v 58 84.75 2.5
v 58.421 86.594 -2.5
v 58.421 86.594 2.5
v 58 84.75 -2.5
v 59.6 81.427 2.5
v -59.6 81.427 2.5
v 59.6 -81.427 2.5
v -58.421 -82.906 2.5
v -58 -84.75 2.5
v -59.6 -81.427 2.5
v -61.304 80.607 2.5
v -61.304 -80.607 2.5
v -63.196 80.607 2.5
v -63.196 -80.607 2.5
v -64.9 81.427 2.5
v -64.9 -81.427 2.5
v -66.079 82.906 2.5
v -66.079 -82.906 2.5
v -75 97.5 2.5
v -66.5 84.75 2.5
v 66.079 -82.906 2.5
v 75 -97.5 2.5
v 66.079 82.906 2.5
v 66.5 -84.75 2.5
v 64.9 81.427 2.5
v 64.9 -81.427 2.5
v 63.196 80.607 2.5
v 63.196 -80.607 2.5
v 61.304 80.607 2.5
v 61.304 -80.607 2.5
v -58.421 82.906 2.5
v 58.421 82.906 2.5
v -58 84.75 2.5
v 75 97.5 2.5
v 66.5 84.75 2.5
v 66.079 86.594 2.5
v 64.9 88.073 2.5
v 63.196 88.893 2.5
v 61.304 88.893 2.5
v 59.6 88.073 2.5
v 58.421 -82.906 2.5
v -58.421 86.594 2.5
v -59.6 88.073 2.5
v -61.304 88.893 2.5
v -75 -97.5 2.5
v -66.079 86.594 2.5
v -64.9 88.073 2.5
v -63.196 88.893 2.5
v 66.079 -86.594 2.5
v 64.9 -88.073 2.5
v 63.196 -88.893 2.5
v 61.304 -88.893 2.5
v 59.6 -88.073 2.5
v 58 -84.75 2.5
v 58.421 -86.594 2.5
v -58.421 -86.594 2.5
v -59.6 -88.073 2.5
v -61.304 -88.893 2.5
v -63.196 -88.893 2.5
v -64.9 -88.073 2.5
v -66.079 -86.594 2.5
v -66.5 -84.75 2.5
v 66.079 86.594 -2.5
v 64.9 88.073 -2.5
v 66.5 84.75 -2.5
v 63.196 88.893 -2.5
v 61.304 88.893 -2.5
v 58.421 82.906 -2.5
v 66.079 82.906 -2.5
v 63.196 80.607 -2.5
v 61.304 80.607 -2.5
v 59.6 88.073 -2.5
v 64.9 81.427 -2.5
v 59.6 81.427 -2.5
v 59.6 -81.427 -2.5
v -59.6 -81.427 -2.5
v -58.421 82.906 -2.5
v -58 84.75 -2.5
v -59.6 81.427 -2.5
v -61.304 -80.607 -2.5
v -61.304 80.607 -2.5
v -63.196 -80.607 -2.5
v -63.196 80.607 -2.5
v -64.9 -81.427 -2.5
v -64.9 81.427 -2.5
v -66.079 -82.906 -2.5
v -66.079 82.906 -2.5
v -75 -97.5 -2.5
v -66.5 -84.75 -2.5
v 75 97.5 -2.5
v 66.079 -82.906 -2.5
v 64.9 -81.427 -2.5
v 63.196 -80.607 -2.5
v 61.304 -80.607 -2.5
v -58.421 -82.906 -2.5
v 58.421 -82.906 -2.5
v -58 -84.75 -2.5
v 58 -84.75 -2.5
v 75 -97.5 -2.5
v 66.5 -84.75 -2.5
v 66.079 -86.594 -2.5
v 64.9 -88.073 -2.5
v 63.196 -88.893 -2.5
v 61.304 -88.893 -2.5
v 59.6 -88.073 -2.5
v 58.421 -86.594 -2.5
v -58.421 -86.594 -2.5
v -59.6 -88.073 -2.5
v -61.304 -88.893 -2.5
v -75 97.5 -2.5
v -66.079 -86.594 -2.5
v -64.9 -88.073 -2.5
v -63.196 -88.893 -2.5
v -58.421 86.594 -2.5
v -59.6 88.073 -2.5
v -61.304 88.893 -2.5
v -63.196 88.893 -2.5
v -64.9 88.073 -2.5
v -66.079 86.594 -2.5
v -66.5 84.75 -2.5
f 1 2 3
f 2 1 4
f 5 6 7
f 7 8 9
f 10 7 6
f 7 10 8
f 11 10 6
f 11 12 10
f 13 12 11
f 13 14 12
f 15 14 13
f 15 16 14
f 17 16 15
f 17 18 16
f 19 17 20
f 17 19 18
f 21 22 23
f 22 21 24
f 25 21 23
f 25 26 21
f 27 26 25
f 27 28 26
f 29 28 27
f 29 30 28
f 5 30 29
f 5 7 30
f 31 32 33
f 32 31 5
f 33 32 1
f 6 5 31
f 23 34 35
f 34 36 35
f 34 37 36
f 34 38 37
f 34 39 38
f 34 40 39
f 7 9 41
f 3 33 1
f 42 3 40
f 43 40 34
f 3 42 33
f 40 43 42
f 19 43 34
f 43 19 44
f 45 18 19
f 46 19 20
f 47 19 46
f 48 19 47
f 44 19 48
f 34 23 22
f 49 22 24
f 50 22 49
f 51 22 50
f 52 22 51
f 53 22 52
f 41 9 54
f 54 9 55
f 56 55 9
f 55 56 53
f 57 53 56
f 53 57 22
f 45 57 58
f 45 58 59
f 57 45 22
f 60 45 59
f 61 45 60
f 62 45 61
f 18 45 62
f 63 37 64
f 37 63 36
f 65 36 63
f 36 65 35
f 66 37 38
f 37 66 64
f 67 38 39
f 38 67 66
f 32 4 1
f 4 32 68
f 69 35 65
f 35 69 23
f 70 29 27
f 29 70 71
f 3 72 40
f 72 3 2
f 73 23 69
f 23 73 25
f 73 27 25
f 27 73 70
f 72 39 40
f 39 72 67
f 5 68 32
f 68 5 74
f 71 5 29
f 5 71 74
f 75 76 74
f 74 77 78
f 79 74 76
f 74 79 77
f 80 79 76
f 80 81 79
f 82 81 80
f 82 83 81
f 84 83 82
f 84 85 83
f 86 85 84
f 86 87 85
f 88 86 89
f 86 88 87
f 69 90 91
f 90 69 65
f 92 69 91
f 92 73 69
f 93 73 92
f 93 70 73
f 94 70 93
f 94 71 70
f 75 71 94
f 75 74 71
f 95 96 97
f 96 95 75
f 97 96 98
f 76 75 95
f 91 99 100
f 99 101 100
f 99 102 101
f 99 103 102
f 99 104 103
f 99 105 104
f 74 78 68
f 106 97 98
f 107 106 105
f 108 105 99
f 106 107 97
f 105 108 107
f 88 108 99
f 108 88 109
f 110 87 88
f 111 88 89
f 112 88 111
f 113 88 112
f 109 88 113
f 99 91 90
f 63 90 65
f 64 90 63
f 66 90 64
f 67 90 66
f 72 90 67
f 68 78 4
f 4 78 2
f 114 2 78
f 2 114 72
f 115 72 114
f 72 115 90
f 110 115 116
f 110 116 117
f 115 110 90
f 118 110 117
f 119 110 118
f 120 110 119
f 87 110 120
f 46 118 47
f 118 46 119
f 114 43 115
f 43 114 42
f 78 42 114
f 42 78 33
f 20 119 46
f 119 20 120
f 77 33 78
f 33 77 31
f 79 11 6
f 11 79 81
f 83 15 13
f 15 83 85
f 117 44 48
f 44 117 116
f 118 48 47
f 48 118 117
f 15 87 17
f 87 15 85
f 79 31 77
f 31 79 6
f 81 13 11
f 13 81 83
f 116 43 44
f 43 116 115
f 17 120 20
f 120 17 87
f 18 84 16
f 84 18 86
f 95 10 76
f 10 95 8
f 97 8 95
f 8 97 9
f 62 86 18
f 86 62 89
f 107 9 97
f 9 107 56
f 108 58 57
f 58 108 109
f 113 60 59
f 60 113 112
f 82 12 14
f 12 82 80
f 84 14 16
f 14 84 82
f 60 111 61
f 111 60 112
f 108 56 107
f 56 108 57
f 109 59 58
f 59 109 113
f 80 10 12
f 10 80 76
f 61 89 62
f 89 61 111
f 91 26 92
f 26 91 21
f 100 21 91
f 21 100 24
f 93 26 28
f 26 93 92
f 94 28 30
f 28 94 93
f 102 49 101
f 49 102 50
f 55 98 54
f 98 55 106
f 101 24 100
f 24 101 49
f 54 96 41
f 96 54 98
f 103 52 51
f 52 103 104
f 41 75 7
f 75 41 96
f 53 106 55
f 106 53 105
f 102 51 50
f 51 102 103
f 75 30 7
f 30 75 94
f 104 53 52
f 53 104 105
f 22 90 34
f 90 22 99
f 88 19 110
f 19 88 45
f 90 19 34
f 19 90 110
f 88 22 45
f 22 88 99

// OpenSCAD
// Generated by SolidPython 1.1.3 on 2023-12-07 16:50:21


difference() {
	cube(center = true, size = [150, 195.0000000000, 5]);
	union() {
		translate(v = [62.2500000000, 84.7500000000]) {
			cylinder(center = true, h = 5, r = 4.2500000000);
		}
		translate(v = [-62.2500000000, 84.7500000000]) {
			cylinder(center = true, h = 5, r = 4.2500000000);
		}
		translate(v = [-62.2500000000, -84.7500000000]) {
			cylinder(center = true, h = 5, r = 4.2500000000);
		}
		translate(v = [62.2500000000, -84.7500000000]) {
			cylinder(center = true, h = 5, r = 4.2500000000);
		}
	}
}
/***********************************************
*********      SolidPython code:      **********
************************************************
 
import solid
import numbers
import pudb
from solid.utils import *
import viewscad
import subprocess
import os
import os.path as osp
import math
import sys

chamfer_extrude=solid.import_scad("./chamfer_extrude.scad")
chamfer_extrude=chamfer_extrude.chamfer_extrude
r = viewscad.Renderer(width=800, height=800)

def debug(model,f_name,path="/home/ts/code/projects/mfd/designs/debug"):
    solid.scad_render_to_file(model,osp.join(path,f_name)+".scad")
#generate position list of wells using offset from center
wells_pos_from_center_4 = lambda offset: [[-offset,offset],
                                        [offset, offset],
                                        [-offset, -offset],
                                        [offset, -offset]]
#wells_pos_from_center_2 = lambda offset: [[0,offset],
#                                        [0, -offset]]
wells_pos_from_center_2 = lambda offset: [[offset,0],
                                        [-offset,0]]

def make_well(dims,shape=None,height=None,dxf=False):
    def circle_cylinder():
        if dxf or (height is None):
            well = solid.circle(r=dims, segments=64)
        else:
            well = solid.cylinder(r=dims, h=height, segments=64, center = True)
        return well
    if dims is None:
        sys.exit("radius needs to be a number")
    if isinstance(dims, numbers.Number):
        well =circle_cylinder()
    elif len(dims)==1:
        if isinstance(dims[1], numbers.Number):
            well =circle_cylinder()
        else:
            sys.exit("radius needs to be a number")
    elif len(dims)==2:
        well = solid.square(dims,center = True)
    elif len(dims)==3:
        well = solid.cube(dims, center = True)
    return well

def wells_top_bottom(center_gap,device_dims=None,shape=None,height=None, positions = None, dxf = False,well_shape=None):
    if well_shape == None:
        well_shape = make_well(device_dims,shape=shape,height=height,dxf=dxf)
    wells = []
    if positions is None:
        offset = radius+radius/2.0
        positions = wells_pos_from_center_2(offset)
    if dxf or (height is None):
        height = 0
    for position in positions:
        if dxf:
            wells.append(solid.translate([position[0],position[1]])(well_shape))
        else:
            wells.append(solid.translate([position[0],position[1],height/2.0])(well_shape))
    return  union()(*wells)

#place wells in four corners 
def four_corner(radius,height=None, positions = None, dxf = False):
    #if well pos not specified set
    #to equally spaced by half radius
    if positions is None:
        offset = radius+radius/2.0
        positions = wells_pos_from_center_4(offset)
    if dxf or (height is None):
        height = 0
    #make wells at positions with specified radius and height
    wells = []
    for position in positions:
        #make circle if making dxf
        if dxf:
            well_shape = solid.circle(r=radius, segments=64)
            well_shape = solid.translate([position[0],position[1]])(well_shape)
        #if stl make cylinder
        else:
            well_shape = solid.cylinder(r=radius, h=height, segments=64, center = True)
            well_shape = solid.translate([position[0],position[1],height/2.0])(well_shape)
        wells.append(well_shape)
    return  union()(*wells)

#generate channels 
def make_channels(length,width,height=0,num_chans=1,max_chans=None,spacing=None, dxf = False,
                  rotate_channels=False):
    if dxf or (height is None):
        height = 0
    #if channel gap not defined, is equal to
    if spacing is None: spacing = width
    #calculate number of channels if fitting max num within given width
    if not max_chans is None:
        import math
        num_chans = math.floor((max_chans-spacing)/(width+spacing))
    #get total width of channel section  
    total_width = (width*num_chans)+(spacing*(num_chans-1))

    #make template channel
    #if rotate_channels: width, length = length, width
    if dxf:
        channel_t = solid.square([length,width],center = True)
    else:
        channel_t = solid.cube([length,width,height], center = True)

    #if number channels is even, offset the first channel to center its gap
    if num_chans % 2 == 0: centering = -(width/2.0+spacing/2.0)
    else: centering = 0
    #move template channel up to align bottom at z = 0 
    #and offset center if necessary
    if dxf:
        channel_t = solid.translate([0,centering])(channel_t)
    else:
        channel_t = solid.translate([0,centering,height/2.0])(channel_t)

    #if rotate_channels: length,width = width,length
    #start making the channels
    channels = []
    for i in range(num_chans):
        #if i=0 there is no translation
        #if i=1, we make the first channel adjacent to second
        direction = i

        #if i>=1, we add channels alternating left and right
        if i >= 1:
            direction = -(i/2.0)
            if i % 2 == 1: direction = (-direction)+0.5
                
        #make channel at right position and add it to channel list
        translation_coords = [0,direction*(width+spacing)]
        #if rotate_channels: translation_coords = [direction*(width+spacing),0]
        if dxf:
            channel = solid.translate(translation_coords)(channel_t)
        else:
            channel = solid.translate([*translation_coords,0])(channel_t)
        channels.append(channel)
    
    #group all channels as one object
    channels = union()(*channels)
    #compute the x,y,z dimensions in order to pass as arguments 
    #for construction of other parts of device (such as the chambers)
    measurements = {'x':(length/2.0,-length/2.0),
                    'y':(total_width/2.0,-total_width/2.0)}
    if not dxf:
        measurements['z'] = (height,0)
    if rotate_channels:
        channels = solid.rotate(90)(channels)
        measurements['x'],measurements['y']=measurements['y'],measurements['x']
    return channels,measurements

def make_chambers(msrs,height=None,extra=0,len_until=None,width=None, dxf = False):
    #computes x,y,z length
    total = lambda x : abs(x[0]) + abs(x[1])
    
    #if specific height if specified
    #otherwise use same height as channels
    if dxf:
        pass
    elif not height is None:
        msrs['z'] = (height,0)
    else:
        msrs['z'] = (0,0)
        
    #make copy of measurements from channels to modify chamber dimensions 
    #and add length to chambers as specified
    chamber_dims = msrs.copy()
    #calculate length of chamber to reach specified offset
    if not len_until is None:
        chamber_len = len_until-(msrs['x'][0])
    #or add specified length to channel length (if not specified, adds 0)
    else:
        chamber_len = msrs['x'][0]+extra
    #set the chamber length based 
    chamber_dims['x'] = (chamber_len/2.0,-(chamber_len/2.0))
    #compute final dimensions of chamber
    if not width is None:
        chamber_dims['y'] = (width/2.0,-width/2.0)
    chamber_dims = [total(size) for size in chamber_dims.values()]
        
    #calculate chamber translation offset to place adjacent to channels
    chamber_trslt = msrs['x'][0]+(chamber_len/2.0)
    #compute chamber translation coordinates to align with channels
    #x = 1 moves chamber above channels
    #x = -1 moves chamber below channels
    if dxf:
        trslt = lambda x : [x*(chamber_trslt),0]
    else:
        trslt = lambda x : [x*(chamber_trslt),0,msrs['z'][0]/2.0]
    
    #function to make chamber at top or at bottom 
    if dxf:
        move = lambda x : solid.translate(trslt(x))(solid.square(chamber_dims, center = True) )
    else:
        move = lambda x : solid.translate(trslt(x))(solid.cube(chamber_dims,center = True))
    #make top and bottom chambers and return them as grouped
    top = move(1)
    bottom = move(-1)
    #chambers=solid.rotate(90)(solid.union()(top,bottom))
    chambers=(solid.union()(top,bottom))

    return chambers

#create alignment features 
def alignment_features(unit,dims,grid_size, mask_size = None, alignment = "hollow", units_from_center = (2.5,2.5), corner_len=None):
    width = grid_size[0]*dims[0]
    length = grid_size[1]*dims[1]
    if mask_size is None and corner_len is None:
        corner_len = (dims[0] + dims[1]) /2 / 8
    corner = lambda thickness_div : solid.union()( solid.square([corner_len,corner_len/thickness_div],center=False), solid.square([corner_len/thickness_div,corner_len],center=False) )
    
    def make_full(thickness_div):
        thickness = corner_len/thickness_div
        tr = solid.translate([0, 0, 0 ])(solid.rotate(180)(corner(thickness_div)))
        tr = solid.translate([thickness/2,thickness/2,0])(tr)
        bl = solid.translate([0, 0, 0 ])(solid.rotate(0)(corner(thickness_div)))
        bl = solid.translate([-thickness/2,-thickness/2,0])(bl)
        return solid.union()(tr,bl)
    
    def make_hollow(thickness_div):
        thickness = corner_len/(thickness_div/2)
        inner = make_full(thickness_div)
        outer = make_full(thickness_div/2)
        hollow = outer - inner 
        return hollow
    
    center = (width /2 , length/2)
    mask_pos = lambda x,y : (center[0] + x*(float(units_from_center[0])*dims[0]), center[1] + y*(float(units_from_center[1])*dims[1]))
    positions = []
    positions.append(mask_pos(1,0))
    positions.append(mask_pos(0,1))
    positions.append(mask_pos(-1,0))
    positions.append(mask_pos(0,-1))
    make_mask = lambda mtype : make_hollow(8) if mtype == "hollow" else make_full(8)
    masks = [ solid.translate([*position,0])(make_mask(alignment)) for position in positions]
    
    solid.scad_render_to_file(solid.union()(*masks),"./designs/open_chamber/masks.scad")
    #return unit - solid.union()(*masks)
    return solid.union()(*masks,unit)

def create_outline(thickness, array, dims, grid_size,):
    width = grid_size[0]*dims[0] + thickness *2
    length = grid_size[1]*dims[1] + thickness *2
    outer = solid.translate([-thickness, -thickness,0])(solid.square([width, length]))
    return outer-array

def create_wall(wall_thickness, outline_thickness, dims, grid_size, wall_height = 2000, dxf = False):
    inner_width = grid_size[0]*dims[0] + outline_thickness *2
    inner_length = grid_size[1]*dims[1] + outline_thickness *2
    outer_width = inner_width + wall_thickness * 2
    outer_length = inner_length + wall_thickness * 2
    outer_pos_x = -outline_thickness-wall_thickness
    outer_pos_y = -outline_thickness-wall_thickness
    inner_pos_x = -outline_thickness
    inner_pos_y = -outline_thickness
    if dxf:
        inner_wall = solid.translate([inner_pos_x,
                                      inner_pos_y,
                                      0])(solid.square([inner_width, inner_length]))
        outer_wall = solid.translate([outer_pos_x,
                                      outer_pos_y,
                                      0])(solid.square([outer_width, outer_length]))

        return outer_wall-inner_wall
    else:
        inner_wall = solid.translate([inner_pos_x,
                                      inner_pos_y,
                                      0])(solid.cube([inner_width, inner_length,wall_height]))
        outer_wall = solid.translate([outer_pos_x,
                                      outer_pos_y,
                                      0])(solid.cube([outer_width, outer_length,wall_height]))

        return outer_wall-inner_wall, {'wall_height': wall_height,
                                       'wall_thickness': wall_thickness,
                                       'inner_width':inner_width,
                                       'inner_length': inner_length,
                                       'outer_width': outer_width,
                                       'outer_length': outer_length,
                                       'outer_pos_x' : outer_pos_x,
                                       'outer_pos_y' : outer_pos_y,
                                       'inner_pos_x' : inner_pos_x,
                                       'inner_pos_y' : inner_pos_y}

def create_thicker_wall(wall_thickness, outer_wall_offset, wall_dims, dims, grid_size, height_start = .2, height_end=2, dxf = False):
    addon_wall,thicker_wall_dims = create_wall(wall_thickness, outer_wall_offset, dims, grid_size, wall_height=height_end-height_start, dxf = False)
    addon_wall = solid.translate([0,0,height_start])(addon_wall)

    thicker_wall_dims['wall_height'] = height_end
    thicker_wall_dims['wall_thickness'] = wall_dims['wall_thickness'] + wall_thickness
    return addon_wall, thicker_wall_dims
 
def add_lock_to_wall(wall,wall_dims,y_offset = 0,cut_ratio=0.7,L_length=3, gap_ratio=0.05, axis="x",width_ratio=1/2):
    # Makes L shape
    def make_L(max_length,length_thickness,max_width,width_thickness,height,y_offset):
        length = solid.cube([max_length,length_thickness,height])
        width = solid.cube([width_thickness,max_width,height])
        width = solid.translate([max_length-(width_thickness),0,0])(width)
        L = solid.union()(width,length)
        debug(L,"L")
        if axis == "x":
            L = solid.rotate(-90)(L)
            L = solid.translate([0,max_length,0])(L)
        else:
            L = solid.rotate(-180)(L)
            L = solid.translate([max_length,max_width,0])(L)
        return solid.translate([0,0,y_offset])(L)
    
    lock_length = L_length
    lock_width = wall_dims['wall_thickness']*width_ratio
    lock_length_thickness = lock_width/2
    lock_width_thickness = lock_width/2
    L_lock = make_L(lock_length,lock_length_thickness,lock_width,lock_width_thickness, wall_dims['wall_height']-y_offset, y_offset)
    
    margin_space = lock_length - lock_length*(1-gap_ratio)
    key_length = lock_length-margin_space
    key_length_thickness = lock_length_thickness-(margin_space*2)
    key_width = lock_width-(margin_space*2)
    key_width_thickness = lock_width_thickness-(margin_space*2)
    L_key = make_L(key_length,key_length_thickness,key_width,key_width_thickness, wall_dims['wall_height']-y_offset, y_offset)
    L_key = solid.translate([margin_space,margin_space,0])(L_key)
    L = solid.union()(L_lock,L_key)
    debug(L,"L")
    
    #Make cube to be used as negative to split frame in a half
    #Can choose if making left or right negative, specify ratio of split
    def make_negative(right,cut_ratio):
        if axis == "x":
            if right:
                length = wall_dims['outer_length']*(1-cut_ratio)
                pos_x = wall_dims['outer_pos_x']+(wall_dims['outer_length']*cut_ratio)
            else:
                length = wall_dims['outer_length']*(cut_ratio)
                pos_x = wall_dims['outer_pos_x'] 
            negative = solid.cube([wall_dims['outer_width'],length, wall_dims['wall_height']])
            negative = solid.translate([wall_dims['outer_pos_y'],pos_x,0])(negative)
        else:
            if right:
                length = wall_dims['outer_width']*(1-cut_ratio)
                pos_x = wall_dims['outer_pos_y']+(wall_dims['outer_width']*cut_ratio)
            else:
                length = wall_dims['outer_width']*(cut_ratio)
                pos_x = wall_dims['outer_pos_y'] 
            negative = solid.cube([length,wall_dims['outer_length'], wall_dims['wall_height']])
            negative = solid.translate([pos_x,wall_dims['outer_pos_x'],0])(negative)
        return negative, pos_x, length 
                      
    #Make negatives
    negative_right, right_half_pos_x, right_half_length = make_negative(True,cut_ratio)
    negative_left, left_half_pos_x, right_half_length = make_negative(False,cut_ratio)
    #Make halves
    left_half = solid.difference()(wall,negative_right)
    right_half = solid.difference()(wall,negative_left)
    def place_L(L, L_length,L_width):
        #Place L on top wall       
        offset_to_center = (wall_dims['wall_thickness']-L_width)/2
        if axis == "x":
            y_pos_top = (wall_dims['outer_pos_y'] +
                    wall_dims['outer_width'] - 
                    L_width - offset_to_center)
            top_L = solid.translate([y_pos_top,
                                     right_half_pos_x-(L_length),
                                     0])(L)
            #Place L on bottom wall       
            y_pos_bottom = wall_dims['outer_pos_y']+offset_to_center
            bottom_L = solid.translate([y_pos_bottom,
                                        right_half_pos_x-L_length,
                                        0])(L)
        else:
            y_pos_top = (wall_dims['outer_pos_x'] +
                    wall_dims['outer_length'] -
                    (L_width+offset_to_center))
            top_L = solid.translate([right_half_pos_x-L_length,
                                     y_pos_top,
                                     0])(L)
            #Place L on bottom wall       
            y_pos_bottom = wall_dims['outer_pos_y']+offset_to_center
            bottom_L = solid.translate([right_half_pos_x-L_length,
                                        y_pos_bottom,
                                        0])(L)
        return bottom_L, top_L
    #Make complimentary L pieces through union and differences
    #Make Lock
    bottom_L_lock, top_L_lock = place_L(L_lock,L_length,lock_width)
    left_half = solid.difference()(left_half,bottom_L_lock)
    left_half = solid.difference()(left_half,top_L_lock)
    #Make Key
    bottom_L_key, top_L_key = place_L(L_key,L_length,lock_width)
    right_half = solid.union()(right_half,bottom_L_key)
    right_half = solid.union()(right_half,top_L_key)
    return left_half, right_half


#build a row x col grid of containment units
def make_unit_array(unit,dims,grid_size, dxf = False, alignment = None, mask_size = None,
                    units_from_center = None,alignment_offset=None, alignment_mark_size=1):
    units = []
    for col in range(grid_size[1]):
        for row in range(grid_size[0]):
            if dxf:
                units.append(solid.translate([row*dims[0],col*dims[1]])(unit))
            else:
                units.append(solid.translate([row*dims[0],col*dims[1],dims[2]/2.0])(unit))
    array = solid.union()(*units)
    if (not alignment is None) and dxf:
        if not alignment_offset is None:
            array = solid.translate([alignment_offset[0],alignment_offset[1]])(array)
        array = alignment_features(array,dims, grid_size, alignment = alignment, mask_size = None, units_from_center = units_from_center,corner_len=alignment_mark_size)
        if not alignment_offset is None:
            array = solid.translate([-alignment_offset[0],-alignment_offset[1]])(array)
    return array


def make_taylor(wells_pos = wells_pos_from_center_4(2.25), well_rad = 1.5 ,
                well_height = 2, chan_w = 0.01, chan_l = 1, chan_h = 0.010 ,
                chan_gap = 0.040, max_chans = None,num_chans=100, chamber_height  = 0.100,
                columns = 1, rows = 1, chamber_len_until=2.25, add_channels = True, add_wells = True, 
                add_chambers = True, save_path = "./", alignment = None, units_from_center = 2,
                mask_size = None, render_stl = False, outline_thickness = 0.050, dxf = True,
                wall_height = 15, wall_thickness = 0.95, casing_x=9, casing_y=9, casing_z=0,rotate_units=0):

    dims = [casing_x, casing_y, casing_z]
    wells = four_corner(well_rad,well_height, dxf = dxf, positions = wells_pos)
    debug(wells,"wells")
    channels, msrs = make_channels(chan_l,chan_w,chan_h,dxf=dxf, spacing = chan_gap, max_chans=max_chans,num_chans=num_chans)
    debug(channels,"channels")
    chambers = make_chambers(msrs,dxf = dxf, height=chamber_height,len_until=chamber_len_until)
    debug(chambers,"chambers")

    #add together and render
    device_parts = []
    if add_channels:
        device_parts.append(channels)
    if add_wells:
        device_parts.append(wells)
    if add_chambers:
        device_parts.append(chambers)
    device=union()(*device_parts)
    device = rotate(rotate_units)(device)

    device=solid.translate([dims[0]/2.0,dims[1]/2.0,0])(device)
    channels = rotate(rotate_units)(channels)
    channels=solid.translate([dims[0]/2,dims[1]/2,0])(channels)
    chambers_wells = union()(wells,chambers)
    chambers_wells = rotate(rotate_units)(chambers_wells)
    chambers_wells=solid.translate([dims[0]/2,dims[1]/2,0])(chambers_wells)

    file_name = str(rows)+'x'+str(columns)+'_units_'
    grid_size = [rows,columns]

    if alignment:
        alignment="full"
    device = make_unit_array(device,dims,grid_size, dxf=dxf, alignment = alignment,
                                 units_from_center = units_from_center)
    channels = make_unit_array(channels,dims,grid_size, dxf=dxf, alignment = alignment,
                                 units_from_center = units_from_center)
    if alignment=="full":
        alignment="hollow"

    chambers_wells = make_unit_array(chambers_wells,dims,grid_size, dxf=dxf, alignment = alignment,
                                 units_from_center =units_from_center)

    def save_model(model,prefix):
        model_fname = os.path.abspath(save_path+prefix+"_"+file_name+".scad")
        solid.scad_render_to_file(model,model_fname)
        return model_fname

    wells_fname = save_model(wells,"wells")
    channels_fname = save_model(channels,"channels")
    device_fname = save_model(device,"device")
    chambers_wells_fname = save_model(chambers_wells,"chambers_wells")
    return (chambers_wells,chambers_wells_fname), (channels,channels_fname), (device,device_fname)

def make_device(design='open',rows=8,columns=6,wells_pos = 4.5,well_offset=3.2, well_rad=3.2,well_height=0.1,
                chan_l=1,chan_w=0.01,chan_h=0.01,chan_gap=0.015,num_chans=101,dxf=True,save_path="./designs/open_chamber/",
                casing_x=9.0,casing_y=18.0,casing_z=0,rotate_units=90,units_from_center=(3,1),chamber_len_until=4.5,
                chamber_width=None,alignment=True, add_wells=True, add_channels=True,add_chambers=True,well_shape=None):

    dims = [casing_x, casing_y, casing_z]
    if design == "open":
        wells_pos=wells_pos_from_center_2(wells_pos)
        wells = wells_top_bottom(well_offset*2,device_dims=well_rad,height=well_height, dxf = dxf, positions = wells_pos,well_shape=well_shape)
    elif design == "closed":
        wells_pos=wells_pos_from_center_4(wells_pos)
        debug(wells,"wells")
        wells = four_corner(well_offset,well_height,device_dims=well_rad, dxf = dxf, positions = wells_pos)
    else:
        print(design+" is not a valid design.\n Choose valid design: 'open' or 'closed'")
        exit()
    wells = rotate(rotate_units)(wells)
    wells=solid.translate([dims[0]/2,dims[1]/2,0])(wells)
    debug(wells,"wells")

    channels, msrs = make_channels(chan_l,chan_w,chan_h,dxf=dxf, spacing = chan_gap, num_chans=num_chans,rotate_channels=False)
    channels = rotate(rotate_units)(channels)
    channels=solid.translate([dims[0]/2,dims[1]/2,0])(channels)

    chambers=make_chambers(msrs,height=None,extra=0,len_until=chamber_len_until, width=chamber_width,dxf = dxf)
    chambers = rotate(rotate_units)(chambers)
    chambers=solid.translate([dims[0]/2,dims[1]/2,0])(chambers)

    device_parts = []
    if add_channels:
        device_parts.append(channels)
    if add_wells:
        device_parts.append(wells)
    if add_chambers:
        device_parts.append(chambers)
    device = union()(*device_parts)
    #device = rotate(rotate_units)(device)
    #device=solid.translate([dims[0]/2.0,dims[1]/2.0,0])(device)

    chambers_wells = []
    if add_chambers:
        chambers_wells.append(chambers)
    if add_wells:
        chambers_wells.append(wells)
    chambers_wells = union()(*chambers_wells)
    #chambers_wells = union()(wells,chambers)
    #chambers_wells = rotate(rotate_units)(chambers_wells)
    #chambers_wells=solid.translate([dims[0]/2,dims[1]/2,0])(chambers_wells)

    file_name = str(rows)+'x'+str(columns)+'_units_'

    grid_size = [rows,columns]
    if alignment:
        alignment="full"
    device = make_unit_array(device,dims,grid_size, dxf=dxf, alignment = alignment,
                                 units_from_center = units_from_center)
    channels = make_unit_array(channels,dims,grid_size, dxf=dxf, alignment = alignment,
                                 units_from_center = units_from_center)
    if alignment=="full":
        alignment="hollow"

    chambers_wells = make_unit_array(chambers_wells,dims,grid_size, dxf=dxf, alignment = alignment,
                                 units_from_center =units_from_center)

    def save_model(model,prefix):
        model_fname = os.path.abspath(save_path+prefix+"_"+file_name+".scad")
        solid.scad_render_to_file(model,model_fname)
        return model_fname

    wells_fname = save_model(wells,"wells")
    channels_fname = save_model(channels,"channels")
    device_fname = save_model(device,"device")
    chambers_wells_fname = save_model(chambers_wells,"chambers_wells")
    return (chambers_wells,chambers_wells_fname), (channels,channels_fname), (device,device_fname)


def make_open_chamber(rows=8,columns=6,wells_pos = wells_pos_from_center_2(4.5), well_rad=3.2,well_height=0.1,
                      chan_l=1,chan_w=0.01,chan_h=0.01,chan_gap=0.015,num_chans=101,dxf=True,save_path="./designs/open_chamber/",
                      casing_x=9.0,casing_y=18.0,casing_z=0,rotate_units=90,units_from_center=(3,1),chamber_len_until=4.5,
                      chamber_width=None,alignment=True, add_wells=True, add_channels=True,add_chambers=True,well_shape=None):

    dims = [casing_x, casing_y, casing_z]
    wells = wells_top_bottom(well_rad,height=well_height, dxf = dxf, positions = wells_pos, well_shape=well_shape)
    channels, msrs = make_channels(chan_l,chan_w,chan_h,dxf=dxf, spacing = chan_gap, num_chans=num_chans,rotate_channels=False)
    chambers=make_chambers(msrs,height=None,extra=0,len_until=chamber_len_until, width=chamber_width,dxf = dxf)
    debug(chambers,"chambers")
    device_parts = []
    if add_channels:
        device_parts.append(channels)
    if add_wells:
        device_parts.append(wells)
    if add_chambers:
        device_parts.append(chambers)
    device = union()(*device_parts)
    device = rotate(rotate_units)(device)
    device=solid.translate([dims[0]/2.0,dims[1]/2.0,0])(device)
    channels = rotate(rotate_units)(channels)
    channels=solid.translate([dims[0]/2,dims[1]/2,0])(channels)
    chambers_wells = union()(wells,chambers)
    chambers_wells = rotate(rotate_units)(chambers_wells)
    chambers_wells=solid.translate([dims[0]/2,dims[1]/2,0])(chambers_wells)

    file_name = str(rows)+'x'+str(columns)+'_units_'

    grid_size = [rows,columns]
    if alignment:
        alignment="full"
    device = make_unit_array(device,dims,grid_size, dxf=dxf, alignment = alignment,
                                 units_from_center = units_from_center)
    channels = make_unit_array(channels,dims,grid_size, dxf=dxf, alignment = alignment,
                                 units_from_center = units_from_center)
    if alignment=="full":
        alignment="hollow"

    chambers_wells = make_unit_array(chambers_wells,dims,grid_size, dxf=dxf, alignment = alignment,
                                 units_from_center =units_from_center)

    def save_model(model,prefix):
        model_fname = os.path.abspath(save_path+prefix+"_"+file_name+".scad")
        solid.scad_render_to_file(model,model_fname)
        return model_fname

    wells_fname = save_model(wells,"wells")
    channels_fname = save_model(channels,"channels")
    device_fname = save_model(device,"device")
    chambers_wells_fname = save_model(chambers_wells,"chambers_wells")
    return (chambers_wells,chambers_wells_fname), (channels,channels_fname), (device,device_fname)

def to_dxf(scad_path):
    dxf_path = scad_path.replace(".scad",".dxf")
    subprocess.call(["openscad", "-o", dxf_path, scad_path])
    import ezdxf
    temp_dxf = ezdxf.readfile(dxf_path)
    temp_dxf.saveas(dxf_path)

#def make_walls(diameter,thickness,grid_size,dims,height=20,segments=256,make_inner=True):
#    wafer_wall_out = solid.cylinder(r=diameter/2,h=height, segments=segments)
#    wafer_wall_in = solid.cylinder(r=(diameter/2-thickness),h=height, segments=segments)
#    wafer_wall = solid.difference()(wafer_wall_out,wafer_wall_in)
#    wafer_wall = solid.translate([grid_size[1]*dims[1]/2.0,grid_size[0]*dims[0]/2.0])(wafer_wall)
#
#    vertical_wall_length = grid_size[1]*dims[1]
#    horizontal_wall_length = grid_size[0]*dims[0]
#    vertical_wall = solid.cube([vertical_wall_length,thickness,height],center = True)
#    vertical_wall = solid.translate([vertical_wall_length/2,0,height/2])(vertical_wall)
#    horizontal_wall = solid.cube([thickness,horizontal_wall_length,height],center = True)
#    horizontal_wall = solid.translate([0,vertical_wall_length/2,height/2])(horizontal_wall)
#    walls = []
#    walls.append(horizontal_wall)
#    walls.append(vertical_wall)
#    for col in range(grid_size[1]):
#        if col == grid_size[1]-1: 
#            walls.append(solid.translate([0,(col+1)*dims[1]])(vertical_wall))
#        elif col > 0 and col < grid_size[1]-1 and make_inner==True:
#            walls.append(solid.translate([0,(col+1)*dims[1]])(vertical_wall))
#    for row in range(grid_size[0]):
#        if row == grid_size[0]-1: 
#            walls.append(solid.translate([(row+1)*dims[0],0])(horizontal_wall))
#        elif row > 0 and row < grid_size[0]-1 and make_inner==True:
#            walls.append(solid.translate([(row+1)*dims[0],0])(horizontal_wall))
#    walls = union()(*walls)
#    wafer_walls = union()(walls,wafer_wall)
#    return walls,wafer_wall,wafer_walls

def make_walls(diameter,thickness,grid_size,dims,height=20,segments=256,make_inner=True,padx=0,pady=0):
    wafer_wall_out = solid.cylinder(r=diameter/2,h=height, segments=segments)
    wafer_wall_in = solid.cylinder(r=(diameter/2-thickness),h=height, segments=segments)
    wafer_wall = solid.difference()(wafer_wall_out,wafer_wall_in)
    wafer_wall = solid.translate([grid_size[1]*dims[1]/2.0,grid_size[0]*dims[0]/2.0])(wafer_wall)

    vertical_wall_length = grid_size[0]*dims[0]+padx
    horizontal_wall_length = grid_size[1]*dims[1]+pady
    vertical_wall = solid.cube([vertical_wall_length,thickness,height],center = True)
    vertical_wall = solid.translate([vertical_wall_length/2-pady/2,-padx/2,height/2])(vertical_wall)
    horizontal_wall = solid.cube([thickness,horizontal_wall_length,height],center = True)
    horizontal_wall = solid.translate([-pady/2,horizontal_wall_length/2-padx/2,height/2])(horizontal_wall)
    walls = []
    walls.append(horizontal_wall)
    walls.append(vertical_wall)
    for col in range(grid_size[1]):
        if col == grid_size[1]-1: 
            walls.append(solid.translate([0,(col+1)*dims[1]+pady])(vertical_wall))
        elif col > 0 and col < grid_size[1]-1 and make_inner==True:
            walls.append(solid.translate([0,(col+1)*dims[1]])(vertical_wall))
    for row in range(grid_size[0]):
        if row == grid_size[0]-1: 
            walls.append(solid.translate([(row+1)*dims[0]+padx,0])(horizontal_wall))
        elif row > 0 and row < grid_size[0]-1 and make_inner==True:
            walls.append(solid.translate([(row+1)*dims[0],0])(horizontal_wall))
    walls = union()(*walls)
    wafer_walls = union()(walls,wafer_wall)
    return walls,wafer_wall,wafer_walls

def save_model(model,base_path,base_name,dxf=True):
    if not os.path.exists(base_path):
        os.makedirs(base_path)
    dxf_path=osp.join(base_path,base_name+".scad")
    solid.scad_render_to_file(model,osp.join(dxf_path))
    if dxf:
        to_dxf(dxf_path)

def make_wafer(diameter,flat_len,thickness):
    wafer = solid.cylinder(r1=diameter/2,r2=diameter/2,h=thickness,segments=512,)()
    x_start_flat=(flat_len/2)
    y_start_flat = math.sqrt(((diameter/2)**2) - (x_start_flat**2) )
    height_delete_flat=diameter/2-y_start_flat
    flat_delete = solid.cube([flat_len,height_delete_flat,thickness],center=False)()
    flat_delete = solid.translate([-flat_len/2,y_start_flat,0])(flat_delete)
    wafer = solid.difference()(wafer,flat_delete)
    wafer = solid.rotate(90)(wafer)
    return wafer

def add_wafer_to_mask(wafer_size,flat_len,mask,grid_size,dims,wafer_line_thickness=0.1,outer_mask_thickness=5,alignment_offset=None):
    def make_wafer_mask(wafer_size,flat_len):
        wafer_mask = make_wafer(wafer_size,flat_len,1)
        wafer_mask = solid.projection()(wafer_mask)
        wafer_mask = solid.translate([grid_size[0]*dims[0]/2.0,grid_size[1]*dims[1]/2.0])(wafer_mask)
        if not alignment_offset is None:
            wafer_mask = solid.translate([-alignment_offset[0],-alignment_offset[1]])(wafer_mask)
        return wafer_mask

    inner_wafer_line_mask = make_wafer_mask(wafer_size-wafer_line_thickness/2,flat_len)
    outer_wafer_line_mask = make_wafer_mask(wafer_size+wafer_line_thickness/2,flat_len)
    outer_wafer_mask = make_wafer_mask(wafer_size+outer_mask_thickness,flat_len)
    outer_wafer_mask = solid.difference()(outer_wafer_mask,outer_wafer_line_mask)
    wafer_mask = solid.union()(outer_wafer_mask,inner_wafer_line_mask)

    return solid.difference()(wafer_mask,mask)

def make_posts(post_shape,post_height):
    posts = solid.linear_extrude(height=post_height)(post_shape)
    return posts

def make_wafer_empty(diameter,flat_len,thickness,margin,notch_len=20,notch_height=5,oversize=1.01):
    diameter*=oversize
    flat_len*=oversize
    wafer = make_wafer(diameter,flat_len,thickness)
    holder = solid.cylinder(r1=diameter/2+margin,r2=diameter/2+margin,h=thickness,segments=512)()
    holder = solid.difference()(holder,wafer)

    x_start_flat=(flat_len/2)
    y_start_flat = math.sqrt(((diameter/2)**2) - (x_start_flat**2) )
    height_delete_flat=diameter/2-y_start_flat
    notch = solid.cube([notch_len,notch_height,thickness],center=False)()
    notch = solid.translate([-notch_len/2,y_start_flat,0])(notch)
    notch = solid.rotate(90)(notch)
    return solid.difference()(holder,notch)

def wafer_print_calibration(diameter,thickness,height,z_offset):
    circles = []
    radii = []
    radii.append(diameter/2.0*0.8)
    radii.append(diameter/2.0*0.6)
    radii.append(diameter/2.0*0.4)
    radii.append(diameter/2.0*0.2)
    for radius in radii:
        inner = solid.cylinder(r1=radius-(thickness/2.0),r2=radius-(thickness/2.0),h=thickness,segments=512,)()
        outer = solid.cylinder(r1=radius+(thickness/2.0),r2=radius+(thickness/2.0),h=thickness,segments=512,)()
        diff = solid.difference()(outer,inner)
        circles.append(diff)
    circles = solid.union()(*circles)
    circles = solid.translate([0,0,z_offset])(circles)
    return circles

def make_rack(wells,dims,grid_size,alignment_offset,rack_x,rack_y,rack_thickness,bolt_width,add_bolts=True):

    #get X and Y dimensions of gride of pipette tips
    X_len = dims[0]*grid_size[0]
    Y_len = dims[1]*grid_size[1]
    #make rack
    rack = solid.cube([rack_x,rack_y,rack_thickness],center=True)

    if add_bolts:
    #add bolt holes
        bolt_hole=solid.cylinder(r=bolt_width/2,h=rack_thickness,center=True)()
        bolt_holes = []
        bolt_holes.append(solid.translate([rack_x/2-1.5*bolt_width,rack_y/2-1.5*bolt_width])(bolt_hole))
        bolt_holes.append(solid.translate([-rack_x/2+1.5*bolt_width,rack_y/2-1.5*bolt_width])(bolt_hole))
        bolt_holes.append(solid.translate([-rack_x/2+1.5*bolt_width,-rack_y/2+1.5*bolt_width])(bolt_hole))
        bolt_holes.append(solid.translate([rack_x/2-1.5*bolt_width,-rack_y/2+1.5*bolt_width])(bolt_hole))
        bolt_holes = solid.union()(*bolt_holes)
        rack=solid.difference()(rack,bolt_holes)
    rack_support = rack

    #center rack with pipette holes
    rack = solid.translate([0,0,rack_thickness/2])(rack)
    rack = solid.translate([X_len/2,Y_len/2])(rack)
    rack = solid.translate([-alignment_offset[0],-alignment_offset[1]])(rack)
    wells = solid.linear_extrude(height=rack_thickness)(wells)
    rack = solid.difference()(rack,wells)
    return rack, rack_support

def make_pillar(wells,dims,grid_size,alignment_offset,rack_x,rack_y,pillar_height,rack_thickness,bolt_width,add_bolts=True,taper_angle=1,bolt_position_corner=1.5):

    #get X and Y dimensions of gride of pipette tips
    X_len = dims[0]*grid_size[0]
    Y_len = dims[1]*grid_size[1]
    #make rack
    rack = solid.cube([rack_x,rack_y,rack_thickness],center=True)
    
    if add_bolts:
    #add bolt holes
        bolt_hole=solid.cylinder(r=bolt_width/2,h=rack_thickness,center=True)()
        bolt_holes = []
        bolt_holes.append(solid.translate([rack_x/2-bolt_position_corner*bolt_width,rack_y/2-bolt_position_corner*bolt_width])(bolt_hole))
        bolt_holes.append(solid.translate([-rack_x/2+bolt_position_corner*bolt_width,rack_y/2-bolt_position_corner*bolt_width])(bolt_hole))
        bolt_holes.append(solid.translate([-rack_x/2+bolt_position_corner*bolt_width,-rack_y/2+bolt_position_corner*bolt_width])(bolt_hole))
        bolt_holes.append(solid.translate([rack_x/2-bolt_position_corner*bolt_width,-rack_y/2+bolt_position_corner*bolt_width])(bolt_hole))
        bolt_holes = solid.union()(*bolt_holes)
        rack=solid.difference()(rack,bolt_holes)
    rack_support = rack

    #center rack with pipette holes
    #rack = solid.translate([0,0,-rack_thickness])(rack)
    rack = solid.translate([X_len/2,Y_len/2])(rack)
    rack = solid.translate([-alignment_offset[0],-alignment_offset[1]])(rack)
    if not taper_angle == 0:
        wells=chamfer_extrude(pillar_height,taper_angle,segments=20)(wells)
    else:
        wells = solid.linear_extrude(height=pillar_height)(wells)
    rack = solid.union()(rack,wells)
    return rack, rack_support

def deg_taper_len(height,deg):
    if not deg == 0:
        return height*math.tan(math.radians(deg))
    else:
        return 0









 
 
************************************************/
